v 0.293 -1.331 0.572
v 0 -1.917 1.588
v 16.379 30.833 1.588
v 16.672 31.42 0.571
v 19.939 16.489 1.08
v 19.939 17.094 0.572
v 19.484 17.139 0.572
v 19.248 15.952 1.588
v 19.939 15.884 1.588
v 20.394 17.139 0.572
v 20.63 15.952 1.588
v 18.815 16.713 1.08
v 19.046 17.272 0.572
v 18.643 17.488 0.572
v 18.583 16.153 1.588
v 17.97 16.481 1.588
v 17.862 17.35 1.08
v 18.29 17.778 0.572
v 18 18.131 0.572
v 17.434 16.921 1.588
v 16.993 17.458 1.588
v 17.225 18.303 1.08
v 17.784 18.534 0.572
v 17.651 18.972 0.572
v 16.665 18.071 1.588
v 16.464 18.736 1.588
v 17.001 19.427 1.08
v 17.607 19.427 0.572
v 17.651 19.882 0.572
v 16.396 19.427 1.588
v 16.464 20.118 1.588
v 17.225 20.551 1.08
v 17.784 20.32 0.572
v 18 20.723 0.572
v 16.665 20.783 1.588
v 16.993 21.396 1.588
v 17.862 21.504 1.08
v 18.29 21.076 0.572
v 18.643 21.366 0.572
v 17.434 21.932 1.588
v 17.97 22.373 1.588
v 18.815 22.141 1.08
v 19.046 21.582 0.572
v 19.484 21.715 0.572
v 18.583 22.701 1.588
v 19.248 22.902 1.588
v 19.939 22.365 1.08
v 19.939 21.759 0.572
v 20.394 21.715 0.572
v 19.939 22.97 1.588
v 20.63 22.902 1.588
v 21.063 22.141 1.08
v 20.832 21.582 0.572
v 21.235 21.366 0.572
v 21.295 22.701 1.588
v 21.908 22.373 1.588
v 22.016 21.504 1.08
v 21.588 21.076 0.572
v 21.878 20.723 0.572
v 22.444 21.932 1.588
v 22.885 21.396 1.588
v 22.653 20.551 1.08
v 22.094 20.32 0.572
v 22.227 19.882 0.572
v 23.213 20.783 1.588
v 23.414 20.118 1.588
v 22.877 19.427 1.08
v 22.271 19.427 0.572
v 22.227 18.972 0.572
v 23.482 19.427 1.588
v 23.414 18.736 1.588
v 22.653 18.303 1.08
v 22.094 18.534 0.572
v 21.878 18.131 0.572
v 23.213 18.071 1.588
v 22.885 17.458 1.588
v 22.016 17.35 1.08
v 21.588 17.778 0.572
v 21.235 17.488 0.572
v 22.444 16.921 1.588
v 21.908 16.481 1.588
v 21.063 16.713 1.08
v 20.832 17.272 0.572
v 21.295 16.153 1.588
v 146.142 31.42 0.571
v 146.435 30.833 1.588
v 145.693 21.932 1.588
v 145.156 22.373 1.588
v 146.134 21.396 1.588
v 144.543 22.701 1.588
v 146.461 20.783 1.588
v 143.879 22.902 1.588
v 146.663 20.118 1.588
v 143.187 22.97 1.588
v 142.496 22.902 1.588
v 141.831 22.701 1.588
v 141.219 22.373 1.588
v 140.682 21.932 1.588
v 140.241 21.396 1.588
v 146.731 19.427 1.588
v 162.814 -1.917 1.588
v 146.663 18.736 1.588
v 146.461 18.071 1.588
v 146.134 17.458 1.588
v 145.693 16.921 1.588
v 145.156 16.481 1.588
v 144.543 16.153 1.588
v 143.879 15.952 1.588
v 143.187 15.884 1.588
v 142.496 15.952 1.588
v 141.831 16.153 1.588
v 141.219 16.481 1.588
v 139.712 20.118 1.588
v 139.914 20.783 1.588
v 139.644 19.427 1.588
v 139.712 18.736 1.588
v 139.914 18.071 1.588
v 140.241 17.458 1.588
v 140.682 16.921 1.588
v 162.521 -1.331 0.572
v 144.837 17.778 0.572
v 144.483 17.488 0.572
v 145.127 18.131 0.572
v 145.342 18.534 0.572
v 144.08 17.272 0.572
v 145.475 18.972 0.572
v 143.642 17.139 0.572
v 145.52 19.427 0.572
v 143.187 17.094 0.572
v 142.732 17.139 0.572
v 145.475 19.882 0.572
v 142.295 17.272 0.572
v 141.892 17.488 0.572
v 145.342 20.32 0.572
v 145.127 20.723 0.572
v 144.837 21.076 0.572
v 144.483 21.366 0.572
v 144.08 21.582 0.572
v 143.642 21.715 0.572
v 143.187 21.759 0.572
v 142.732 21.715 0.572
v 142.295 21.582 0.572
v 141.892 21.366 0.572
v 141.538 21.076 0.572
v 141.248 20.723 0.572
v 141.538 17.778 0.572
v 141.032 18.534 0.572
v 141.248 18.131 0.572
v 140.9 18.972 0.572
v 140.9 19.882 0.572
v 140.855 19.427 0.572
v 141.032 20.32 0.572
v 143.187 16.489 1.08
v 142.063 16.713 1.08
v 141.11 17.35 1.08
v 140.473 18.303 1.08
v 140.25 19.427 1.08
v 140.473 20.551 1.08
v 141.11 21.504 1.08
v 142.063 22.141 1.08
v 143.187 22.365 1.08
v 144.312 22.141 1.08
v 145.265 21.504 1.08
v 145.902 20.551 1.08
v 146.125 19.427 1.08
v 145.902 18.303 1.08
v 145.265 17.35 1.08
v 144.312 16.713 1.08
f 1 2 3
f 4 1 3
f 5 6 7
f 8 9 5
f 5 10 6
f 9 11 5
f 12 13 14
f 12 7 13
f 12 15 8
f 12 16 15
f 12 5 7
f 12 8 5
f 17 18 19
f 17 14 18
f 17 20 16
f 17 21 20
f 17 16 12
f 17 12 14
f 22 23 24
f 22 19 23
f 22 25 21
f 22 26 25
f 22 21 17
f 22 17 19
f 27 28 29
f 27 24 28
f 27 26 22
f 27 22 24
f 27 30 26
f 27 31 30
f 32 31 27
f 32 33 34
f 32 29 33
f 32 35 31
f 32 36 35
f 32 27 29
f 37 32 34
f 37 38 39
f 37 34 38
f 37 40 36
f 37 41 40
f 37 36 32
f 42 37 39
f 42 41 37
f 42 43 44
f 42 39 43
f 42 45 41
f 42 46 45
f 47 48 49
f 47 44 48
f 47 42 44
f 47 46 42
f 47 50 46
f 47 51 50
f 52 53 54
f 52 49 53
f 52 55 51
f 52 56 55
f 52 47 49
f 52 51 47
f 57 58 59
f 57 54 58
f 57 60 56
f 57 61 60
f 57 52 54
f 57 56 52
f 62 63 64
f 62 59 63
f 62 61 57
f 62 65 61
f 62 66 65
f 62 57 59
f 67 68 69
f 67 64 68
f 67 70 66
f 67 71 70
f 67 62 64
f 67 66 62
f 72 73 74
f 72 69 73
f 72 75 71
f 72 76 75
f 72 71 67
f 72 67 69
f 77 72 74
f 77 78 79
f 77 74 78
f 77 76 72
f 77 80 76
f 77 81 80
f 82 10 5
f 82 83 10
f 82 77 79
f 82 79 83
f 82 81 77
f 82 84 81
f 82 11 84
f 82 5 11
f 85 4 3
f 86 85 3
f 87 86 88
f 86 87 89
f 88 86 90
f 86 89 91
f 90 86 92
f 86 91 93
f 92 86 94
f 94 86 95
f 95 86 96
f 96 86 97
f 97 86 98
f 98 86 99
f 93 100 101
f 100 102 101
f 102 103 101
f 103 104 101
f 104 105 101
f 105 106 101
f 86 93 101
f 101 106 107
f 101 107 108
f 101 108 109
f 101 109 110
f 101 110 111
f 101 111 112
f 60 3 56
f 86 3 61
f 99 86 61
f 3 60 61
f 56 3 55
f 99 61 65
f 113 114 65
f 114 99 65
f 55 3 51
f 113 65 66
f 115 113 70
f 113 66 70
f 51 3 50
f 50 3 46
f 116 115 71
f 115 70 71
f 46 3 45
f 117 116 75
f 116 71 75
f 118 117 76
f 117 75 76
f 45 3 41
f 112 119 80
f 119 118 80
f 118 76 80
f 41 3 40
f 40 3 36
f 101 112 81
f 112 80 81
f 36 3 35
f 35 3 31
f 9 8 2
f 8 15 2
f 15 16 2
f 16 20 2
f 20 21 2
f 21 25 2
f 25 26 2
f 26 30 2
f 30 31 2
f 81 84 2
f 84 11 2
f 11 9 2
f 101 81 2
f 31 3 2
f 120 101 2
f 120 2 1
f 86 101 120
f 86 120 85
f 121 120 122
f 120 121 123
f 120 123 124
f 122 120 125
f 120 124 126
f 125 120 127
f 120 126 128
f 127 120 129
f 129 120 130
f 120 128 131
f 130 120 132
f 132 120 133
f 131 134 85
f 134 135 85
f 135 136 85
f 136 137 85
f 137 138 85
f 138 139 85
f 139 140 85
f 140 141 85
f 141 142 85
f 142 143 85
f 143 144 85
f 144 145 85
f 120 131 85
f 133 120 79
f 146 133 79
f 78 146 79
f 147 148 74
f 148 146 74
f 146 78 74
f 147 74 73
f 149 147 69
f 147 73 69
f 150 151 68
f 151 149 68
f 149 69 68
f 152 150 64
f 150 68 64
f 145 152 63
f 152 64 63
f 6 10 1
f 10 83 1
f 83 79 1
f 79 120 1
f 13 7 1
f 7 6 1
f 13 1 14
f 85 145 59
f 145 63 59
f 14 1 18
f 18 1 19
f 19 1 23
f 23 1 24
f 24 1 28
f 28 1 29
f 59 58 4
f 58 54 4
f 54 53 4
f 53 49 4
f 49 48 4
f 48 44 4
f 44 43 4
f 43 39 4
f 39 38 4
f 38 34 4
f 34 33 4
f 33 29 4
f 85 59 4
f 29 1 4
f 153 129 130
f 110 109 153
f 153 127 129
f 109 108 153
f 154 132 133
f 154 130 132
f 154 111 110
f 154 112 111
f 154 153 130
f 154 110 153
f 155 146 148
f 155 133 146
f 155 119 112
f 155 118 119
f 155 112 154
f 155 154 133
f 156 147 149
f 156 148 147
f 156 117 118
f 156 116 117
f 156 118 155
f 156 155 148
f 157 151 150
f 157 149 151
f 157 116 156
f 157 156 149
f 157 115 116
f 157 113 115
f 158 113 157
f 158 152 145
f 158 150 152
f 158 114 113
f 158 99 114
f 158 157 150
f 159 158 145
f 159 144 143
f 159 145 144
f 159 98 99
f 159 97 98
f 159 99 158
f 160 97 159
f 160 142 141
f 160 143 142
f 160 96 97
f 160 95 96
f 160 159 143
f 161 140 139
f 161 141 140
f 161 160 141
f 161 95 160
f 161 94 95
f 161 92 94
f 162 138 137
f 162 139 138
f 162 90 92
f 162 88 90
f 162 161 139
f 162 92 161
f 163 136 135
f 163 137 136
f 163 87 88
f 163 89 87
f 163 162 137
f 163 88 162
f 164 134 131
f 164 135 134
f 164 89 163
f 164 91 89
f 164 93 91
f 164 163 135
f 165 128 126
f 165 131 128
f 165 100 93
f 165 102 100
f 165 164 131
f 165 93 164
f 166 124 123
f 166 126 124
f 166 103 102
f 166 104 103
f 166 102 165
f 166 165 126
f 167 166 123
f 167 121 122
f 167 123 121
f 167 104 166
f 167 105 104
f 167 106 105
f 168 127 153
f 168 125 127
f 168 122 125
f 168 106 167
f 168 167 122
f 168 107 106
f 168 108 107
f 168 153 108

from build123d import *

# Parameters (mm, degrees)
BOSS_EXTRUDE2_DEPTH                       = 162.814
CUT_EXTRUDE1_DEPTH                        = 166.821138692
CSK_FOR_6_FLAT_HEAD_MACHINE_SCREW_2_COUNT = 2
CSK_FOR_6_FLAT_HEAD_MACHINE_SCREW_2_PITCH = 123.248406325


with BuildPart() as part:
    # Sketch3 → Boss-Extrude2 (new body)
    with BuildSketch(Plane(origin=(0, 0, 0), x_dir=(0, 0, -1), z_dir=(1, 0, 0))):
        Polygon((-0.5715, 31.420044321), (-1.5875, 30.833456448), (-1.5875, -1.917455679), (-0.5715, -1.330867805), align=None)
    extrude(amount=BOSS_EXTRUDE2_DEPTH)

    # Sketch5 → Cut-Extrude1 (cut, through all)
    with BuildSketch(Plane.XY.offset(1.5875)):
        Polygon((0, -1.917455679), (16.672349491, 31.420044321), (0, 31.420044321), align=None)
        Polygon((162.814, -1.917455679), (146.141650509, 31.420044321), (162.814, 31.420044321), align=None)
    extrude(amount=-CUT_EXTRUDE1_DEPTH, mode=Mode.SUBTRACT)

    # Sketch7 → CSK for #6 Flat Head Machine Screw (100)1 (revolve, cut)
    with BuildSketch(Plane(origin=(19.939, 19.426957216, 1.5875), x_dir=(0, -1, 0), z_dir=(1, 0, 0))):
        Polygon((0, 0), (0, 1.016), (1.89865, 1.016), (1.89865, 1.380025208), (3.5433, 0), align=None)
    csk_for_6_flat_head_machine_screw_100 = revolve(axis=Axis((19.939, 19.426957216, 7.9375), (0, 0, -1)), mode=Mode.SUBTRACT)

    # CSK for _6 Flat Head Machine Screw _ 2: CSK for #6 Flat Head Machine Screw (100)1 ×2
    with Locations(*[(i * CSK_FOR_6_FLAT_HEAD_MACHINE_SCREW_2_PITCH, 0, 0) for i in range(1, CSK_FOR_6_FLAT_HEAD_MACHINE_SCREW_2_COUNT)]):
        add(csk_for_6_flat_head_machine_screw_100, mode=Mode.SUBTRACT)


solid = part.part
